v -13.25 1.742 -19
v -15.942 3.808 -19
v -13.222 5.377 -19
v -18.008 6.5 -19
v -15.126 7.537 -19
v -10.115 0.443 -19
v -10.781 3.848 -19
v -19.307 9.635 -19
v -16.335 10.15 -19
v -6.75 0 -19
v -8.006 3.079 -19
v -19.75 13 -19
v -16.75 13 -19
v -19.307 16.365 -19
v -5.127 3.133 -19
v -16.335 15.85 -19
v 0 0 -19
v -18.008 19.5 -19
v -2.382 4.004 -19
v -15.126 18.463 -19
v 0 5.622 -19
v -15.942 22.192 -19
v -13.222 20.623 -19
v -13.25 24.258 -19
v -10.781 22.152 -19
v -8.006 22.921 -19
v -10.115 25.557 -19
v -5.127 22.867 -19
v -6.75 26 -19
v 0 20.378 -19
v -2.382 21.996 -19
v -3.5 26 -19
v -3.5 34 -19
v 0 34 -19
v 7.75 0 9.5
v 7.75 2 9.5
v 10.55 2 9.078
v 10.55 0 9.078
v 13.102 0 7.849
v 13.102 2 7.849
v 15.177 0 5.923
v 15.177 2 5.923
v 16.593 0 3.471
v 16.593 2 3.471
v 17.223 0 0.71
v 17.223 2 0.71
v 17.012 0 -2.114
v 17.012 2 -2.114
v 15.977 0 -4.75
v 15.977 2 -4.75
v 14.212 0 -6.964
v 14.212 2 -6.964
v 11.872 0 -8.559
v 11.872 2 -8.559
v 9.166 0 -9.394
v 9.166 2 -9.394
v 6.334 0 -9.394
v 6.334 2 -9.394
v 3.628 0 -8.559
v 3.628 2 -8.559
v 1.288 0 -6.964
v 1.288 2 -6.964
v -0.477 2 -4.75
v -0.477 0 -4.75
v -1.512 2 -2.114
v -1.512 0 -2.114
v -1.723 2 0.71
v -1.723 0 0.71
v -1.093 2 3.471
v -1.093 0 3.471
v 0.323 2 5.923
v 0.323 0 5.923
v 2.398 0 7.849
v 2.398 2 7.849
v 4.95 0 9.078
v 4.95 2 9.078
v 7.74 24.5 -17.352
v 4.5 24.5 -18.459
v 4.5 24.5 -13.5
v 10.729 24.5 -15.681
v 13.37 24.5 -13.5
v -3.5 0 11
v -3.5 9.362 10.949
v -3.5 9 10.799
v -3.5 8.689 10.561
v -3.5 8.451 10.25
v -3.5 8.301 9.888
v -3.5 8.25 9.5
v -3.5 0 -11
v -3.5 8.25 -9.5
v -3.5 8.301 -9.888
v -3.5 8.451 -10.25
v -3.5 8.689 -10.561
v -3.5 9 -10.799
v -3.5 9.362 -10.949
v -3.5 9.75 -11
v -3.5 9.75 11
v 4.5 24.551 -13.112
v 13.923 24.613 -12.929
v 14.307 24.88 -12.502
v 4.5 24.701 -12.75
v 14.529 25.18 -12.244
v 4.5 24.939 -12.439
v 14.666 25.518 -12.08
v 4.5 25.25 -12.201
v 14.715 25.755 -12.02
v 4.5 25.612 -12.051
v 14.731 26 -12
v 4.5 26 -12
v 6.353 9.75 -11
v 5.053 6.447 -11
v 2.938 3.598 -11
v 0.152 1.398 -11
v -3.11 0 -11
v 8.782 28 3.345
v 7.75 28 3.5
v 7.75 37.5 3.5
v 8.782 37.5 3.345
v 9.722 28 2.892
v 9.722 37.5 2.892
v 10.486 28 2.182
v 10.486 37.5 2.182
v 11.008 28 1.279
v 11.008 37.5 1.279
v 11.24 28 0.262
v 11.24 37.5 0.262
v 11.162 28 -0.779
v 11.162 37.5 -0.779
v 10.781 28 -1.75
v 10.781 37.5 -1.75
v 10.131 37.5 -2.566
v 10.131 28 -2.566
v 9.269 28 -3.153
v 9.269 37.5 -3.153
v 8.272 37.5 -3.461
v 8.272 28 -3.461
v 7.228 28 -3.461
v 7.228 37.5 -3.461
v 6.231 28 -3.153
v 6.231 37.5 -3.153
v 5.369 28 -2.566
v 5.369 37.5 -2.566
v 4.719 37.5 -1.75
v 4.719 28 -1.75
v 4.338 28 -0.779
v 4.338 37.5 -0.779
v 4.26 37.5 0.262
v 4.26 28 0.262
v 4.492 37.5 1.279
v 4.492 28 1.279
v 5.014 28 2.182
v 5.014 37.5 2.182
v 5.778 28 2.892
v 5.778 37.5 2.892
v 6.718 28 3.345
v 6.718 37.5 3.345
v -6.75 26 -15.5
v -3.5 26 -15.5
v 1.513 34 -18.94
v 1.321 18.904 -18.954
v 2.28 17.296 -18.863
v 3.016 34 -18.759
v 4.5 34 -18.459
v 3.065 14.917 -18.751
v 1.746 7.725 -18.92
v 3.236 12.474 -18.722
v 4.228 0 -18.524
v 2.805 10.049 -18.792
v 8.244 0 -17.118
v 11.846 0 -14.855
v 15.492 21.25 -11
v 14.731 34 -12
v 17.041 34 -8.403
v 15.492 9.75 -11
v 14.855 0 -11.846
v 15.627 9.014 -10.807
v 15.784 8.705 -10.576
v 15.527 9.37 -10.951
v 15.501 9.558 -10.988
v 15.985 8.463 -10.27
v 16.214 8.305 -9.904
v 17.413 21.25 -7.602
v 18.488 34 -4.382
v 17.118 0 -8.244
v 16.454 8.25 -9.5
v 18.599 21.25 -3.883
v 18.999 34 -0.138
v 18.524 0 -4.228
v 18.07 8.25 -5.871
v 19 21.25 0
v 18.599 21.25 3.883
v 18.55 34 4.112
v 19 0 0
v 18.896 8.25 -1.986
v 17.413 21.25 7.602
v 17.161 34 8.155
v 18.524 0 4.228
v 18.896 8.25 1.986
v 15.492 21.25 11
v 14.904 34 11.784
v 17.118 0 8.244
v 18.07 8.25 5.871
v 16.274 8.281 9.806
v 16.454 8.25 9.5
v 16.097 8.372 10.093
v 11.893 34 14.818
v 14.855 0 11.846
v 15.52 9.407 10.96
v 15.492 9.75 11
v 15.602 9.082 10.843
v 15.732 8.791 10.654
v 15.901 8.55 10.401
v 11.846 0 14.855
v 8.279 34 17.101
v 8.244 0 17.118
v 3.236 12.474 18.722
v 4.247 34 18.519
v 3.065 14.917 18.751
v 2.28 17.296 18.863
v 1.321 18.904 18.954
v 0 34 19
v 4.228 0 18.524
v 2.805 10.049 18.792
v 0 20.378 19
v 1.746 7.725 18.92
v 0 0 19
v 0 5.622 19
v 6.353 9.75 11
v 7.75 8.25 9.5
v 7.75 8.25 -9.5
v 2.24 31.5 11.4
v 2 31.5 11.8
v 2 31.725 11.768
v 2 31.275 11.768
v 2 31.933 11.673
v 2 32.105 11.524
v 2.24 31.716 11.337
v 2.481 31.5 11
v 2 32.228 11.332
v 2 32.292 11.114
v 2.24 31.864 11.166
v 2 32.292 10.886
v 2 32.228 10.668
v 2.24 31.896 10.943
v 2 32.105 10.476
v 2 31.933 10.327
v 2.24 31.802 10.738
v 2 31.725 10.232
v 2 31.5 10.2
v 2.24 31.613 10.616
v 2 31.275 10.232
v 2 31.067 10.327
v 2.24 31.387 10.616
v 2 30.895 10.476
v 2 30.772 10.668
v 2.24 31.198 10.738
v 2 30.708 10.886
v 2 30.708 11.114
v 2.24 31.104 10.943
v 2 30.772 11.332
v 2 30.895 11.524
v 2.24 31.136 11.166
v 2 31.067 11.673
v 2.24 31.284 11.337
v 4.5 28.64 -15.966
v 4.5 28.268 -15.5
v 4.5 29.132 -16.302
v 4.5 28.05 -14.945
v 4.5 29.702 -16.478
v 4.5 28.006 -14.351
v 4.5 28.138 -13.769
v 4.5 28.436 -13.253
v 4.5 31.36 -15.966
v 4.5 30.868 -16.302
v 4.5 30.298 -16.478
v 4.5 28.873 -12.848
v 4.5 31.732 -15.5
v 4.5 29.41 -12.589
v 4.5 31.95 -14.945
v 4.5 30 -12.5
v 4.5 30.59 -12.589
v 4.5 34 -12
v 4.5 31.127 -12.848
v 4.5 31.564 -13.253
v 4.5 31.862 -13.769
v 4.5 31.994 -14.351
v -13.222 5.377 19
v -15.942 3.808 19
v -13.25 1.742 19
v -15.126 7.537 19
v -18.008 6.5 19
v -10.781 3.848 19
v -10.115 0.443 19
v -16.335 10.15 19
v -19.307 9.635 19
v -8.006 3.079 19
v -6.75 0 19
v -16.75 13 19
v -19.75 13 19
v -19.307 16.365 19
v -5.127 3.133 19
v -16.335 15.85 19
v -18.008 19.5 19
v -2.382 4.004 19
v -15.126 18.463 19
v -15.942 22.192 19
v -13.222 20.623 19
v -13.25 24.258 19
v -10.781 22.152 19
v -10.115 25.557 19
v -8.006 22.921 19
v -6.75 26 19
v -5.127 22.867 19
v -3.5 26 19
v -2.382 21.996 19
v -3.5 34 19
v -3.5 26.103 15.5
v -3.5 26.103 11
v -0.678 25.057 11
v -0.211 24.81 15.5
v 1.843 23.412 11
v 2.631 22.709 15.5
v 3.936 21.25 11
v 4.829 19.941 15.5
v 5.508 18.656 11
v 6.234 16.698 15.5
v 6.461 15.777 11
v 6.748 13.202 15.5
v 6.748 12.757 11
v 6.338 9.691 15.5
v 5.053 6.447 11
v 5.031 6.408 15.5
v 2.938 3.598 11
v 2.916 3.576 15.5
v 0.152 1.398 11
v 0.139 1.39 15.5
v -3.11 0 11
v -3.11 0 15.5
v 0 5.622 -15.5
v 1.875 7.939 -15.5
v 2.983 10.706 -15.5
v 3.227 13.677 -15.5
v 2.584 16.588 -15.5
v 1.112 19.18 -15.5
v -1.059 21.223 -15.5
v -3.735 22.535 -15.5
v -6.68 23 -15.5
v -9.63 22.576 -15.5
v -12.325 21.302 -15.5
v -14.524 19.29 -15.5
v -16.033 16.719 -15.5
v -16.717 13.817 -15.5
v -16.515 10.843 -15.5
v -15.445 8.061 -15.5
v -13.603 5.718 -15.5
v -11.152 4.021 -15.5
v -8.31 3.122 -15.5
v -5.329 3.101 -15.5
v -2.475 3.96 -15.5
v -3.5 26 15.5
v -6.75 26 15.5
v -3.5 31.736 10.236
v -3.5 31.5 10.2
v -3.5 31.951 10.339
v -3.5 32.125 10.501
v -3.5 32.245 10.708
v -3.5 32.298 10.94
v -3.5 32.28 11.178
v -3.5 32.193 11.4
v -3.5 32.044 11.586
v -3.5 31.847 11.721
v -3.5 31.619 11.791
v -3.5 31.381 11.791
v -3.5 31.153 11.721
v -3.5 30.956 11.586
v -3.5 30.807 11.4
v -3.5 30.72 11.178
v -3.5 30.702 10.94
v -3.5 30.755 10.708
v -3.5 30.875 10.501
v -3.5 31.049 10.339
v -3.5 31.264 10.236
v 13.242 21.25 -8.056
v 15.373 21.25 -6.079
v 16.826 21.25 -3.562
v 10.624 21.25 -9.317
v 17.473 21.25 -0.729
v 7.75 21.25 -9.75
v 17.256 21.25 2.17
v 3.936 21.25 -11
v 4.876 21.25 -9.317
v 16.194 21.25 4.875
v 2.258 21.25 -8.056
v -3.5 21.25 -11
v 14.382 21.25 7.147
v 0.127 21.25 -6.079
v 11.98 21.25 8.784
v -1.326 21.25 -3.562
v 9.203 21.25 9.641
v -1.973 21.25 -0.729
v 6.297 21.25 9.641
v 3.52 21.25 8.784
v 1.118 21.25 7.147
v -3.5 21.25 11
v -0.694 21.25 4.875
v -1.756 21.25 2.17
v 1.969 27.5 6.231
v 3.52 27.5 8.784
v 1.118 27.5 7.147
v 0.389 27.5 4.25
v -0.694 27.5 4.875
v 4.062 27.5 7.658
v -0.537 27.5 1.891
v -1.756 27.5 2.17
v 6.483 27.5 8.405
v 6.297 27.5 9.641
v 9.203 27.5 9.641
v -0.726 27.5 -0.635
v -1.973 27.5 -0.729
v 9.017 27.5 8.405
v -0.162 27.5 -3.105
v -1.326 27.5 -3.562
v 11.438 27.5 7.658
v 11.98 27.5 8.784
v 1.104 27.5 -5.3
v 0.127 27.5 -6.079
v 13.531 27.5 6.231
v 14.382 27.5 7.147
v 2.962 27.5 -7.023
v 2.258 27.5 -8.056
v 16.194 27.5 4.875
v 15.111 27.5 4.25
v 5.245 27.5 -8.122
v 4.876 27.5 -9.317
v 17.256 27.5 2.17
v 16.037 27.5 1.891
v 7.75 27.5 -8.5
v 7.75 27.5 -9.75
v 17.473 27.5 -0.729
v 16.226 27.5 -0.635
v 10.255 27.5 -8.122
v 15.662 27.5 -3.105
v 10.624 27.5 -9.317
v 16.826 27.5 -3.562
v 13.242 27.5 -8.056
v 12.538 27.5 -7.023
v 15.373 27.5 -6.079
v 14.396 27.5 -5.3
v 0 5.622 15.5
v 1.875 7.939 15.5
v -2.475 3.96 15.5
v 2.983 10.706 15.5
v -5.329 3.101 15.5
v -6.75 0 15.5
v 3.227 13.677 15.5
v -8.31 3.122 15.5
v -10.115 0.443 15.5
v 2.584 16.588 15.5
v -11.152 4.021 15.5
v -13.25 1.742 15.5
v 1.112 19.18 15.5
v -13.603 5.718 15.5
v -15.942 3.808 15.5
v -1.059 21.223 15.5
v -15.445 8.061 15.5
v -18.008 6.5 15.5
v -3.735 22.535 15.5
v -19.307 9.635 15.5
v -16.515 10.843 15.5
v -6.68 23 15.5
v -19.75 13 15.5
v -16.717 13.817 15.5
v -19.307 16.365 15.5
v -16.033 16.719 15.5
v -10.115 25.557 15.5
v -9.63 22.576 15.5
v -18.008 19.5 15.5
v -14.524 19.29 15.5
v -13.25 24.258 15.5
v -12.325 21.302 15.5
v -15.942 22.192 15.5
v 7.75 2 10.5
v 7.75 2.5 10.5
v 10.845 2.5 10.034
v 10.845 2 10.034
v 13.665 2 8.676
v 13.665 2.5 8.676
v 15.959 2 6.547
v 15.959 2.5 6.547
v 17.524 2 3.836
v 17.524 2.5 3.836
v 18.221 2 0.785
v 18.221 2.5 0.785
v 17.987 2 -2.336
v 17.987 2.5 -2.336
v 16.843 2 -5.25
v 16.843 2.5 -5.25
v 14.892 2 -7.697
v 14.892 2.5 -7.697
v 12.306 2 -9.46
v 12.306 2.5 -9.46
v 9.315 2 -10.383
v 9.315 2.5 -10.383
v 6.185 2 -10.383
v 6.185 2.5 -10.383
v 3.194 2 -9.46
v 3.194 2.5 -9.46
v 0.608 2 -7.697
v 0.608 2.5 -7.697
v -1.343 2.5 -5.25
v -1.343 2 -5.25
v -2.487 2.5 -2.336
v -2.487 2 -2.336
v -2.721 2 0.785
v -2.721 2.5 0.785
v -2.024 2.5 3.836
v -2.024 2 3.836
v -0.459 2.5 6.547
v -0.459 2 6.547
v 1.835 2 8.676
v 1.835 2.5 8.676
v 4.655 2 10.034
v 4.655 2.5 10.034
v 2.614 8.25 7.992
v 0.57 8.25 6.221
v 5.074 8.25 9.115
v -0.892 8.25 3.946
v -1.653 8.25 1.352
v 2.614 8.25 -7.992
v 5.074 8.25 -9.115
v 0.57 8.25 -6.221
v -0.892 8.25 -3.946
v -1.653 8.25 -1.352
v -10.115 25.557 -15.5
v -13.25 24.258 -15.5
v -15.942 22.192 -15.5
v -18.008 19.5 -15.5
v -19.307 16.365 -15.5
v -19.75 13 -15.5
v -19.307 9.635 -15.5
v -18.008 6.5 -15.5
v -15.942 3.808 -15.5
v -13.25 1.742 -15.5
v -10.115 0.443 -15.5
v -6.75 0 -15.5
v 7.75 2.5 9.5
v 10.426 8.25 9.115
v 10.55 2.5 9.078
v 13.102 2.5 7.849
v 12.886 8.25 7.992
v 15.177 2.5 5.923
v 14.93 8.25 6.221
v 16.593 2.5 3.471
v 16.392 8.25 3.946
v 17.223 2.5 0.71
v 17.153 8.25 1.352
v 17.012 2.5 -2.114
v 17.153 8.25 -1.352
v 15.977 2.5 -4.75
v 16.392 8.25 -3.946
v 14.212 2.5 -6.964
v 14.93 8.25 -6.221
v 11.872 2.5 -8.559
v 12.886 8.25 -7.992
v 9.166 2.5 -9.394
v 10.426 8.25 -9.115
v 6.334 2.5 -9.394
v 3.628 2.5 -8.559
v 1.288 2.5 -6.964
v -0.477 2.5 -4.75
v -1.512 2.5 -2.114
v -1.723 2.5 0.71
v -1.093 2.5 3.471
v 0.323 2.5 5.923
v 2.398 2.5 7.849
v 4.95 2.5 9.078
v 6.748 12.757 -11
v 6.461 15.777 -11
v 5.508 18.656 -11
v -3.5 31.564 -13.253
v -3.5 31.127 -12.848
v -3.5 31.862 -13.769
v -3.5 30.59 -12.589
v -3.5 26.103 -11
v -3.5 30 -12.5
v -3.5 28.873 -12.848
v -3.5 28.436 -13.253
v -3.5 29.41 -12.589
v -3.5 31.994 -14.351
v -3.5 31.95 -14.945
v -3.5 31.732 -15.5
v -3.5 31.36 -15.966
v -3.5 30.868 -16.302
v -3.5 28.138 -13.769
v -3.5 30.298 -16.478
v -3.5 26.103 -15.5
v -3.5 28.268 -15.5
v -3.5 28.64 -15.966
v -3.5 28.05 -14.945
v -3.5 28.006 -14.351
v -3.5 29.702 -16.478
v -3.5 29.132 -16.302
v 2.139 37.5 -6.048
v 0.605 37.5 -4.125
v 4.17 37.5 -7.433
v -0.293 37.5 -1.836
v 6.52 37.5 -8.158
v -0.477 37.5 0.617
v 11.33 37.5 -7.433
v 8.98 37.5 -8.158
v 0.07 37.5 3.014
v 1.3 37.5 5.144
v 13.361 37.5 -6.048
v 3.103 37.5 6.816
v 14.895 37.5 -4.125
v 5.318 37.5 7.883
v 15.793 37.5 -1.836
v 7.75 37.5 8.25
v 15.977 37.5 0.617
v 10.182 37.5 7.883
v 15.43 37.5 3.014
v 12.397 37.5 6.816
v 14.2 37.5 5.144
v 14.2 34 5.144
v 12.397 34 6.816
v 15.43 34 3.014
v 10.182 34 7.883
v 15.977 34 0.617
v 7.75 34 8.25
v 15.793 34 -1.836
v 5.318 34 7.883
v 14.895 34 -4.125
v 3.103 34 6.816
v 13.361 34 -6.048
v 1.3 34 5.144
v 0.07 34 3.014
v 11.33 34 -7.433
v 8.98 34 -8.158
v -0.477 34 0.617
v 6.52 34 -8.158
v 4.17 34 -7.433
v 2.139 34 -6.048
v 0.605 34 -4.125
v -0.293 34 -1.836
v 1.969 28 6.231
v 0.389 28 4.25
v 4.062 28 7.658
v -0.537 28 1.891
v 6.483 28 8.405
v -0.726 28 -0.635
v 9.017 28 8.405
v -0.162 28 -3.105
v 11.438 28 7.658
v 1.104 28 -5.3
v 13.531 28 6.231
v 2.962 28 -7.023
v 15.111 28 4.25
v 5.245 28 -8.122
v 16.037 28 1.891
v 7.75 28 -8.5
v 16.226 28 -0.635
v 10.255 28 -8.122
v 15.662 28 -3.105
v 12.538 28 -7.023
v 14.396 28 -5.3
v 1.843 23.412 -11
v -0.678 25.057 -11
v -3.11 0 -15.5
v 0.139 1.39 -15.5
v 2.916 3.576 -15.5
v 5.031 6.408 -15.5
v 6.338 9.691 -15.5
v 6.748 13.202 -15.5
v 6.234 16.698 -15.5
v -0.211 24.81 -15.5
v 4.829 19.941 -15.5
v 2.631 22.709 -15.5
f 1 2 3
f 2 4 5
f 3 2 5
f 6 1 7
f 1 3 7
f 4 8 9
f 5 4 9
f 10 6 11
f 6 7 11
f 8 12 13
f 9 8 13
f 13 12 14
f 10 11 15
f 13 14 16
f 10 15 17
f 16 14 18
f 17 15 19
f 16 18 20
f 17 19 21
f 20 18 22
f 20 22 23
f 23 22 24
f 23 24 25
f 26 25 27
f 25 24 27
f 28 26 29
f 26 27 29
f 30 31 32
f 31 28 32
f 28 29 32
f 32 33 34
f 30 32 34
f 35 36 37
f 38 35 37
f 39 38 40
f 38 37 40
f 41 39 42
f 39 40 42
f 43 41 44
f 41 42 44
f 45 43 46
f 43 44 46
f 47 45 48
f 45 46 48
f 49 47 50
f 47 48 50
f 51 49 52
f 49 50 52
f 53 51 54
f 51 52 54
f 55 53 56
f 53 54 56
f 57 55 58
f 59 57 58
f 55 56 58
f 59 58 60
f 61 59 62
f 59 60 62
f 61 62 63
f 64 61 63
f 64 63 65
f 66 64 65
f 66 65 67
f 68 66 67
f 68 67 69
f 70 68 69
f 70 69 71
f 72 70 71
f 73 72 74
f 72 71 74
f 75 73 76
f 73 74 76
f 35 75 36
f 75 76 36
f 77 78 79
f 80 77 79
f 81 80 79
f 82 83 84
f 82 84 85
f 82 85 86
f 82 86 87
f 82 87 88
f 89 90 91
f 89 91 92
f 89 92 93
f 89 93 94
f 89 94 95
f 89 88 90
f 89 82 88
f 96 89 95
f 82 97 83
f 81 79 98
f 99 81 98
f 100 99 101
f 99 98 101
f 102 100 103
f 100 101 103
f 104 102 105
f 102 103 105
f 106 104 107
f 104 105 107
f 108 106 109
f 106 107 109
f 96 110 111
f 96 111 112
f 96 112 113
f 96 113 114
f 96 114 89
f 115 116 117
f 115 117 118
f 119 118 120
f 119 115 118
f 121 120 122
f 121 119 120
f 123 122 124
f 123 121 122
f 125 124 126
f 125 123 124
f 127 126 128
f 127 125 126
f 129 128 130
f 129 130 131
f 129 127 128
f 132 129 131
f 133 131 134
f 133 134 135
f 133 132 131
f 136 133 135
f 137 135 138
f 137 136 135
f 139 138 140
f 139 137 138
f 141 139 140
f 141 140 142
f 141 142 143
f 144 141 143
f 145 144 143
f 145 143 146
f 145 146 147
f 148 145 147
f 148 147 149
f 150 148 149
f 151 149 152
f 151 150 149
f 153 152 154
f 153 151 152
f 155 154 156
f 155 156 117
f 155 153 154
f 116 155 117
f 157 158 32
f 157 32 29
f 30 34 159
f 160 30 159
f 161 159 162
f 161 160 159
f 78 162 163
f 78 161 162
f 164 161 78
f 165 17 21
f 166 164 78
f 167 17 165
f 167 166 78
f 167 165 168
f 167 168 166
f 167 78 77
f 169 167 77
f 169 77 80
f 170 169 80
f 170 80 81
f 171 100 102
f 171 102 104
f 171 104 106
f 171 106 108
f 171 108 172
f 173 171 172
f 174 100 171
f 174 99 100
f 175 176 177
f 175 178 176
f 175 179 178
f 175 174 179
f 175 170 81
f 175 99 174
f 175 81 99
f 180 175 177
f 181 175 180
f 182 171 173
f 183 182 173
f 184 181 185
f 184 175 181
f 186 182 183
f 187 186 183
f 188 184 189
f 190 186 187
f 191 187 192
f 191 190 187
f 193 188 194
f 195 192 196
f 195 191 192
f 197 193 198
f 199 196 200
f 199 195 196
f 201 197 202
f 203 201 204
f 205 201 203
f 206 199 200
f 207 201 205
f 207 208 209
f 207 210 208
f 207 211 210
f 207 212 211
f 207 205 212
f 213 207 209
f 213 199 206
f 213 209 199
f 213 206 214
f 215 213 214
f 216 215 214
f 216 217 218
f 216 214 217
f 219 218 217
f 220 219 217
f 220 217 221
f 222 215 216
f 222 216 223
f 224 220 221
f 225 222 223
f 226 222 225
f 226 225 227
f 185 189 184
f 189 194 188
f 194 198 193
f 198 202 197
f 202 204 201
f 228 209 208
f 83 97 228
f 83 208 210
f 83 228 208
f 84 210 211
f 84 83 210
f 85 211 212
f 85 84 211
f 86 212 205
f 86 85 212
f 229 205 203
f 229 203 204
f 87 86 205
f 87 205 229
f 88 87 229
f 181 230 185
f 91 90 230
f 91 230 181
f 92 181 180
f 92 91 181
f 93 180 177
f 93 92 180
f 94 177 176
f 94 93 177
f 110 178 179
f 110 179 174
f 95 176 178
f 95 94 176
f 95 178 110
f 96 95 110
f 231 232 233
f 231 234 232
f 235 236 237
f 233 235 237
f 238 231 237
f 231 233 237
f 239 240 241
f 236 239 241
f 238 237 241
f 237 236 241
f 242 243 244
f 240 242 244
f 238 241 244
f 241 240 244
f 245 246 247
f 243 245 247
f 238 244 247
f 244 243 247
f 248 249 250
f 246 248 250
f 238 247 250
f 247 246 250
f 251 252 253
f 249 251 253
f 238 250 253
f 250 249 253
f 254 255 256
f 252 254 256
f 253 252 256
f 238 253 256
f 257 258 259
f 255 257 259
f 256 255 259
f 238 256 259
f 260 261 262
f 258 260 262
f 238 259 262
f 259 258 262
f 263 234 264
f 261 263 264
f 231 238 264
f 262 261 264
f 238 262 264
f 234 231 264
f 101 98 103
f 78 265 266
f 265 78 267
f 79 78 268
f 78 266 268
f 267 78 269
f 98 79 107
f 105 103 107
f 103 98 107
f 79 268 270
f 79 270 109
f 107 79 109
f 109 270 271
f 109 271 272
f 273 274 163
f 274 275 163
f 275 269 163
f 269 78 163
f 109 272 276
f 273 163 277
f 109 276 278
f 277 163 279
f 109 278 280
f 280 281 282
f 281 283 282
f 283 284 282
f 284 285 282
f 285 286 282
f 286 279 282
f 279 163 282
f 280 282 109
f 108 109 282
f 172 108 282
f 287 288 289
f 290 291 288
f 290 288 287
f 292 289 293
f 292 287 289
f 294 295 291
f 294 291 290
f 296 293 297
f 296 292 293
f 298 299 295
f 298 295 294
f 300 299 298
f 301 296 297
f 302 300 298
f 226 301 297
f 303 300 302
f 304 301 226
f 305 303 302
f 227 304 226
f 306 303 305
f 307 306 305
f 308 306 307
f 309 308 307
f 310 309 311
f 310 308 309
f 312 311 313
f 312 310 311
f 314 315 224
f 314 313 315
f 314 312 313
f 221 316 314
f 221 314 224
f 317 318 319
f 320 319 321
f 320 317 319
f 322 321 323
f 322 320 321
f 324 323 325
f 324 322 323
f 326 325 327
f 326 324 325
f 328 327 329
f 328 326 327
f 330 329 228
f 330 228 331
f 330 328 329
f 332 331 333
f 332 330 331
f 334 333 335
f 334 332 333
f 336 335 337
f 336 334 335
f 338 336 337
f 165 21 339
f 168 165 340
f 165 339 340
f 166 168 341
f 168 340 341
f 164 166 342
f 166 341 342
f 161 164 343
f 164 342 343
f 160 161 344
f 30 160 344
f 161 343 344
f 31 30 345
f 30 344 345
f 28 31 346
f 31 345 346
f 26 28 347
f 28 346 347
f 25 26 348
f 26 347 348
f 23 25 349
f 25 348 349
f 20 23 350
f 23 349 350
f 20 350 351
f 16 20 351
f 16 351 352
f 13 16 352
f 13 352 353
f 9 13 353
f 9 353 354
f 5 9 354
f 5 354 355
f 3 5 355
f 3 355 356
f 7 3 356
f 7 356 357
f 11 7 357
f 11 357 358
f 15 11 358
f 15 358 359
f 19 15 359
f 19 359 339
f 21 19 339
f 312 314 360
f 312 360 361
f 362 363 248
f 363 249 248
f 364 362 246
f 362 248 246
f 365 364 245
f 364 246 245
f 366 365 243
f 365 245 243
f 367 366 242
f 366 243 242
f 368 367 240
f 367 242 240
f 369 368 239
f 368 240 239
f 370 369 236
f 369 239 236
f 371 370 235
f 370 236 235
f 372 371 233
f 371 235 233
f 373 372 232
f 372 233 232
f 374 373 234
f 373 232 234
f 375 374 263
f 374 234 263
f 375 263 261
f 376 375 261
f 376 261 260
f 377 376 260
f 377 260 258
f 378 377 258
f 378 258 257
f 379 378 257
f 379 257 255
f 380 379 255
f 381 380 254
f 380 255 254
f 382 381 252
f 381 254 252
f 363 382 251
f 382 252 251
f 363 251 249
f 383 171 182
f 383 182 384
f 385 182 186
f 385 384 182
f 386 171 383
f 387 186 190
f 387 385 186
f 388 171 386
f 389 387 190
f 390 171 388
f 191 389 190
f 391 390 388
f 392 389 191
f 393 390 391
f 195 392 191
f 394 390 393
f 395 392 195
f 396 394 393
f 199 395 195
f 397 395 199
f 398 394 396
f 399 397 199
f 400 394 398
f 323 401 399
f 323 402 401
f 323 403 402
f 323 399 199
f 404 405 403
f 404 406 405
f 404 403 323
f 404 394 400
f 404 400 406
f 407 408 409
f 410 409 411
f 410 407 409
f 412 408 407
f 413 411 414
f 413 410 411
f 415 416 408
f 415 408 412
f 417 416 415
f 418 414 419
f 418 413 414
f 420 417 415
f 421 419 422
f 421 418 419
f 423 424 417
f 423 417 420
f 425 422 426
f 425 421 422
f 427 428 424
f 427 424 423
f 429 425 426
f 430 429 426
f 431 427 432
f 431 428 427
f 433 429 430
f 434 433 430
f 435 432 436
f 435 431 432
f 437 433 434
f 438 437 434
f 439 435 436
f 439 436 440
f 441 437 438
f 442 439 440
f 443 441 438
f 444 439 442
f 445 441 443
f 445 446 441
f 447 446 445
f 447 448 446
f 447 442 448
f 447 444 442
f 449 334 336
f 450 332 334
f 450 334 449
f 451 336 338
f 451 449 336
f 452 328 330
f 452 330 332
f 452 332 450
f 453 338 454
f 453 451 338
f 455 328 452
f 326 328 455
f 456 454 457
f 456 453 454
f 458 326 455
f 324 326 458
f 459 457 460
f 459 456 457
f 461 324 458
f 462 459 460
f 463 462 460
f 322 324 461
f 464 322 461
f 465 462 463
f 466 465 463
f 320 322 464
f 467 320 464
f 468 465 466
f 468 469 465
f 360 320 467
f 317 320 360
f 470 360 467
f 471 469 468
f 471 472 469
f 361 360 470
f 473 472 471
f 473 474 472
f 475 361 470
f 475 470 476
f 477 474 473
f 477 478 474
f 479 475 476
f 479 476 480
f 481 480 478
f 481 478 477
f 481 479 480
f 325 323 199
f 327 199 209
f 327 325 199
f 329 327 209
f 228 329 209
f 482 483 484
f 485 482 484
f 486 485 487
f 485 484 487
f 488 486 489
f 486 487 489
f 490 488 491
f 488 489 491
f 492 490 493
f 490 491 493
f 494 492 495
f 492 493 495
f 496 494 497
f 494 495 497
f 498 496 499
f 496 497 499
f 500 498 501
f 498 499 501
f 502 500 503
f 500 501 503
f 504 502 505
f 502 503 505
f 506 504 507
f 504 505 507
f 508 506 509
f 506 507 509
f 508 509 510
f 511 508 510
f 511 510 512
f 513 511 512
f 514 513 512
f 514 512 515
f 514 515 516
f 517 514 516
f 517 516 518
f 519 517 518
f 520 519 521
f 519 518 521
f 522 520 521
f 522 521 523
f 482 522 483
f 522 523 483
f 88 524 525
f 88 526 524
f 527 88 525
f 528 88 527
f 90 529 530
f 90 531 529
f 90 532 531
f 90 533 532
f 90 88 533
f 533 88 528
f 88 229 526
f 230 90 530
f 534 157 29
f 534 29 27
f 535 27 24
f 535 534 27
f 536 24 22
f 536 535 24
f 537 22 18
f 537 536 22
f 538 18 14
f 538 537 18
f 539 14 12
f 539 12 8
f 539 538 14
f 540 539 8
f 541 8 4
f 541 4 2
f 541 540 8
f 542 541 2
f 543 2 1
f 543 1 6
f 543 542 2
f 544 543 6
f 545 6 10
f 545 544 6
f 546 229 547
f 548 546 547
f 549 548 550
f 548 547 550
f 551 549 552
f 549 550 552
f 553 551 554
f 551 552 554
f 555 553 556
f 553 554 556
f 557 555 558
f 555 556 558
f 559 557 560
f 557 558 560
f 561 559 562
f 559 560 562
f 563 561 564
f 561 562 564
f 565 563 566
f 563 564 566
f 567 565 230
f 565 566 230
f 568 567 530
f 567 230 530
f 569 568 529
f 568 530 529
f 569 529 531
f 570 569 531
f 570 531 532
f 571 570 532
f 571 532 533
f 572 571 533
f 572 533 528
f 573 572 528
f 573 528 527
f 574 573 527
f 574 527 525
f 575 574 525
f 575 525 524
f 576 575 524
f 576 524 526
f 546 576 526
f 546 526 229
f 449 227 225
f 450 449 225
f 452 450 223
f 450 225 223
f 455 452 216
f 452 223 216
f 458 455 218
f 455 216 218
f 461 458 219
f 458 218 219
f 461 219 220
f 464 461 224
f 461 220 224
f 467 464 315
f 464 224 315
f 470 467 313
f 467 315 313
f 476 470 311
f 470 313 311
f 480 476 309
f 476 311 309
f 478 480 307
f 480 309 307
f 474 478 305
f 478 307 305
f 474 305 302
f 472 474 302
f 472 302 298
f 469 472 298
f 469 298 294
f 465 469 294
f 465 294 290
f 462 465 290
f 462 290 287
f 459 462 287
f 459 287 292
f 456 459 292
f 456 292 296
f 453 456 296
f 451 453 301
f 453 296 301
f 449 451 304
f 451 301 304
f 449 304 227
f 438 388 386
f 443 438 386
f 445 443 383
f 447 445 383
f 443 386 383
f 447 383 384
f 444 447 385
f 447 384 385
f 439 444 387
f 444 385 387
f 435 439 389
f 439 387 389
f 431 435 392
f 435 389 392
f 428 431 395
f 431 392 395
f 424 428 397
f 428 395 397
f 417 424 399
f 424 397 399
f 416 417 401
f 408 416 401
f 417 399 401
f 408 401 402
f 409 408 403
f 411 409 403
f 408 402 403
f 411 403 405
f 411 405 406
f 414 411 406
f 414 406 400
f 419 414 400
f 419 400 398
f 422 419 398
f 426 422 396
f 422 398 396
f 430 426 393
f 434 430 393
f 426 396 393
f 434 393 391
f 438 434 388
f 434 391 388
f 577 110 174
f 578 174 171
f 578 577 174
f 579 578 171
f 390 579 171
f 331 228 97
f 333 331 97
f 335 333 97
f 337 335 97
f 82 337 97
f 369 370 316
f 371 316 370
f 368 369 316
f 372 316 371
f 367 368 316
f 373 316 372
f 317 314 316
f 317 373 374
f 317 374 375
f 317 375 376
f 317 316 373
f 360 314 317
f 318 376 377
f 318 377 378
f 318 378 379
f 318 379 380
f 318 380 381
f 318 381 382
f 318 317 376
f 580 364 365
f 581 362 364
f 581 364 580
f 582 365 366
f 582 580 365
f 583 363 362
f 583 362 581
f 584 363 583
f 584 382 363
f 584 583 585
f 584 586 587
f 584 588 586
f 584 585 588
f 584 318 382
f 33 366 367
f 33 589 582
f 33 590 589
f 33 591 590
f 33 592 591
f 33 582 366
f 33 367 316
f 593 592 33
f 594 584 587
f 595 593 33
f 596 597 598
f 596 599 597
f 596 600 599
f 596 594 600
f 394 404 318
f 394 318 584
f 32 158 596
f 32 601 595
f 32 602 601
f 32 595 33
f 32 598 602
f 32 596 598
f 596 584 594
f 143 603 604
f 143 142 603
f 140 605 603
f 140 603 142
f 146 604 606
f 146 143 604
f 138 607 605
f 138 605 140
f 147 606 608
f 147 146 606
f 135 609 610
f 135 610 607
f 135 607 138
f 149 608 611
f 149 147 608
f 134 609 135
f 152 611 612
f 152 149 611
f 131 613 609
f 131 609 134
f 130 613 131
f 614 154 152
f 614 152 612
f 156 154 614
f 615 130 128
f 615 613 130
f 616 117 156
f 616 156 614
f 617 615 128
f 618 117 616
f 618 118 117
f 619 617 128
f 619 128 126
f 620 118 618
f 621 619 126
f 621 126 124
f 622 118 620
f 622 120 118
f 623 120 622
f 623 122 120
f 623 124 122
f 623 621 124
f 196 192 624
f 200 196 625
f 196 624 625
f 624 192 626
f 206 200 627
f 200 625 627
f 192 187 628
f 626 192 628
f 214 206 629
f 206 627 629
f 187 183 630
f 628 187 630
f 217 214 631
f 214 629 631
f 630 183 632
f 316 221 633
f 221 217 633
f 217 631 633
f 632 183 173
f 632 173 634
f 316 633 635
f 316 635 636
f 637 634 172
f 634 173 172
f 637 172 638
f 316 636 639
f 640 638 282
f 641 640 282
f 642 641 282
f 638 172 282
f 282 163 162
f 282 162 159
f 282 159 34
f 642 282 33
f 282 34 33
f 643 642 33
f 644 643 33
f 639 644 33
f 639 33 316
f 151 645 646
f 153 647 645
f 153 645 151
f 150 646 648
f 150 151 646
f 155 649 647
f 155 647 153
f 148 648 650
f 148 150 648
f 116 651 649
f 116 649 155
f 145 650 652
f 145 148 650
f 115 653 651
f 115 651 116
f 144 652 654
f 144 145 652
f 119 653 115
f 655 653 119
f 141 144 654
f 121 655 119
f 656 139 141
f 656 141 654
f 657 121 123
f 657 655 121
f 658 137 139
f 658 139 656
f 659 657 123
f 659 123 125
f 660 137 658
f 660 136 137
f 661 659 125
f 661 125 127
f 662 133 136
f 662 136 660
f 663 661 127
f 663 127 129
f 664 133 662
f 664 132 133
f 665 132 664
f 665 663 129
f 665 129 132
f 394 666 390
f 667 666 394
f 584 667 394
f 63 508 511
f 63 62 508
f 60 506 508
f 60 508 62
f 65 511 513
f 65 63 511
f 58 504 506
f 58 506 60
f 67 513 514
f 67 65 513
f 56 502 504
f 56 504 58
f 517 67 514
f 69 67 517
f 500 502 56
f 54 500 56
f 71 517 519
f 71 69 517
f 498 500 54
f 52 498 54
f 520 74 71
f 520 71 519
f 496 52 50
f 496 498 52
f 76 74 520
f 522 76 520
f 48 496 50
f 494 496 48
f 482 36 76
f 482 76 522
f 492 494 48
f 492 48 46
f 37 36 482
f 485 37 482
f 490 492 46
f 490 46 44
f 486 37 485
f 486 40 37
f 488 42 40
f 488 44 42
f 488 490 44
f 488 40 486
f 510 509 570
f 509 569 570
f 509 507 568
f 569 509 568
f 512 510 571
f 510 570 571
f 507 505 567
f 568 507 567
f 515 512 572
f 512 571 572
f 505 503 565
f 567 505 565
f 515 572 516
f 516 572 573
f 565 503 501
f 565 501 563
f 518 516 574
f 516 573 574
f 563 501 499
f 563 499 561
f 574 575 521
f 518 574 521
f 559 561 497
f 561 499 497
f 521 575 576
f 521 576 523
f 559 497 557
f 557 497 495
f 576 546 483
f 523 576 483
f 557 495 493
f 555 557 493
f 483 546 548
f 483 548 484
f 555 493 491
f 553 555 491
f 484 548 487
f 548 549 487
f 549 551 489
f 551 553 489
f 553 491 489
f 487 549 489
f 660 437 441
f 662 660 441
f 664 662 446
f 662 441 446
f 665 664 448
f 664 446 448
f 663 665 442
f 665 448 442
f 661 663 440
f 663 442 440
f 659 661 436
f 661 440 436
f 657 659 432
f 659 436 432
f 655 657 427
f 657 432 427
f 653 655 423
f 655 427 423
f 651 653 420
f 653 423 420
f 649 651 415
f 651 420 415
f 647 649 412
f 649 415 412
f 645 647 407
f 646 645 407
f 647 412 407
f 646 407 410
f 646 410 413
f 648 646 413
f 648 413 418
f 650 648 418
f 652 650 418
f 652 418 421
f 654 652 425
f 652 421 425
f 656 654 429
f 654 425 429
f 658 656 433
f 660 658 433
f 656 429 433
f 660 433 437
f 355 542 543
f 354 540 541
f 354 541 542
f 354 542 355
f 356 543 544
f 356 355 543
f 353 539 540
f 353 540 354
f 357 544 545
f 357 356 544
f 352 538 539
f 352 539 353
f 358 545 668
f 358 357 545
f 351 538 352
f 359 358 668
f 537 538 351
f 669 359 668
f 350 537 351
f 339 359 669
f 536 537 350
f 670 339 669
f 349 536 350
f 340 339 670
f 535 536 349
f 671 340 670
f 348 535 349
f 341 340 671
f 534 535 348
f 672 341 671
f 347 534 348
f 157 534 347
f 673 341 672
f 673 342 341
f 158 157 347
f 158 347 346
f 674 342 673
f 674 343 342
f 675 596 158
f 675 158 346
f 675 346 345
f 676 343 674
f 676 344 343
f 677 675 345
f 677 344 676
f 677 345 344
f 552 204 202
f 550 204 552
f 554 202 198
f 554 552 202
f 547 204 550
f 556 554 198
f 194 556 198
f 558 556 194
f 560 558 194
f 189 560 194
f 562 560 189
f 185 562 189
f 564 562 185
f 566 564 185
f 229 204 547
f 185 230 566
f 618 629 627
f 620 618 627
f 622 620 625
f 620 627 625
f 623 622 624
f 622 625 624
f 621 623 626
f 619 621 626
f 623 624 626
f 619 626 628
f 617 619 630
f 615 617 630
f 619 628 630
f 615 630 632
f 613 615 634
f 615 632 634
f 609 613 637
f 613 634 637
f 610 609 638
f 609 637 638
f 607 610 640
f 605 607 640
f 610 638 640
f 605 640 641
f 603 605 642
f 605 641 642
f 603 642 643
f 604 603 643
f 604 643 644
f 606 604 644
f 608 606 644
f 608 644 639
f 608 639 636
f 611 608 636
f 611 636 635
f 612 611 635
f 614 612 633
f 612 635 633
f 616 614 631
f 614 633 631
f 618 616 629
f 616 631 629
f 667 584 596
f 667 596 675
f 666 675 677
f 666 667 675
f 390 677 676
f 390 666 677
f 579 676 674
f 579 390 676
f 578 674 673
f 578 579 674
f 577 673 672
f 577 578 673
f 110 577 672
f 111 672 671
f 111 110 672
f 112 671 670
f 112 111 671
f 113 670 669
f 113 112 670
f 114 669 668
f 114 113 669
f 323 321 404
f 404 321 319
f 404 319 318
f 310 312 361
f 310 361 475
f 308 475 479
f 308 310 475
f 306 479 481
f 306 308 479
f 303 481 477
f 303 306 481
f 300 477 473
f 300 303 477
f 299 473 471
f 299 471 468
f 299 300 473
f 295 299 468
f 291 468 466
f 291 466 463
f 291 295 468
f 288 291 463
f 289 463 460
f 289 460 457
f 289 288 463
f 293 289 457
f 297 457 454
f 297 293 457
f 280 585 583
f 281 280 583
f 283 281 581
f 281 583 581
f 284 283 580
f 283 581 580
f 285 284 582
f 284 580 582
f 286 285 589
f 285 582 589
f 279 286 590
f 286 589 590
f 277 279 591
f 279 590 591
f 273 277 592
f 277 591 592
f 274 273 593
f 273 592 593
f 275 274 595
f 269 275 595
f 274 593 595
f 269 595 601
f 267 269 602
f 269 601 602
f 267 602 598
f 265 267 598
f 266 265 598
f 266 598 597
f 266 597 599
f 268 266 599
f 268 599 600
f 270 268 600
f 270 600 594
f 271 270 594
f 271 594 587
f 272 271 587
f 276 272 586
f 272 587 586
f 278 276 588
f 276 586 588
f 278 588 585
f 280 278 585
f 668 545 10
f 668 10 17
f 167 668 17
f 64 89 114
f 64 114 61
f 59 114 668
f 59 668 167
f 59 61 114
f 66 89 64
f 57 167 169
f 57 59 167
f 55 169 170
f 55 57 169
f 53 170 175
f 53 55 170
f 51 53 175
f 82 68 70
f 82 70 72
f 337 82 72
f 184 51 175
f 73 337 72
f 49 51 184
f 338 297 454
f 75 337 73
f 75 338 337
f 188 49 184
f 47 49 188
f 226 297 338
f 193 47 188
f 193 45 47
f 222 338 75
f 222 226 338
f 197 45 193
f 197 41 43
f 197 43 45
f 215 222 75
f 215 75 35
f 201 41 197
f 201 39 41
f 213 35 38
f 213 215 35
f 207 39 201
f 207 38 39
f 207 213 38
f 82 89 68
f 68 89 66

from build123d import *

# Parameters (mm, degrees)
SKETCH2_R               = 3.5
BOSS_EXTRUDE1_DEPTH     = 34
SKETCH19_R              = 8.25
SKETCH19_R_2            = 3.5
BOSS_EXTRUDE3_DEPTH     = 3.5
BOSS_EXTRUDE2_DEPTH     = 3.5
SKETCH4_R               = 10
CUT_EXTRUDE1_DEPTH      = 3.5
LPATTERN4_COUNT         = 2
LPATTERN4_PITCH         = 34.5
CUT_EXTRUDE3_DEPTH      = 48.681233293
SKETCH7_R               = 13.5
CUT_EXTRUDE4_DEPTH      = 4.5
LPATTERN3_COUNT         = 2
LPATTERN3_PITCH         = 26.5
M2_TAPPED_HOLE1_D       = 1.6
M2_TAPPED_HOLE1_DEPTH   = 5.5
M2_TAPPED_HOLE1_TIP     = 0.480688495
SKETCH17_R              = 2
CUT_EXTRUDE5_DEPTH      = 8
CUT_EXTRUDE6_REACH      = 50.532
CUT_EXTRUDE6_END_RADIUS = 19
SKETCH20_R              = 9.75
CUT_EXTRUDE7_DEPTH      = 6.25
SKETCH21_R              = 8.5
CUT_EXTRUDE8_DEPTH      = 0.5
SKETCH22_R              = 9.5
CUT_EXTRUDE9_DEPTH      = 5.75
SKETCH23_R              = 10.5
CUT_EXTRUDE10_DEPTH     = 0.5
SKETCH24_R              = 9.5
CUT_EXTRUDE11_DEPTH     = 2


with BuildPart() as part:
    # Sketch2 → Boss-Extrude1 (new body)
    with BuildSketch(Plane(origin=(0, 0, 0), x_dir=(1, 0, 0), z_dir=(0, 1, 0))):
        with BuildLine():
            Line((-3.5, -19), (-3.5, 19))
            Line((-3.5, 19), (0, 19))
            ThreePointArc((0, 19), (19, 0), (0, -19))
            Line((0, -19), (-3.5, -19))
        make_face()
        with Locations(Location((7.75, 0, 0), (0, 0, 270))):
            Circle(SKETCH2_R, mode=Mode.SUBTRACT)
    extrude(amount=BOSS_EXTRUDE1_DEPTH)

    # Sketch19 → Boss-Extrude3 (add)
    with BuildSketch(Plane(origin=(0, 34, 0), x_dir=(1, 0, 0), z_dir=(0, 1, 0))):
        with Locations(Location((7.75, 0, 0), (0, 0, 270))):
            Circle(SKETCH19_R)
        with Locations(Location((7.75, 0, 0), (0, 0, 270))):
            Circle(SKETCH19_R_2, mode=Mode.SUBTRACT)
    extrude(amount=BOSS_EXTRUDE3_DEPTH)

    # Sketch3 → Boss-Extrude2 (add)
    with BuildSketch(Plane.XY.offset(19)):
        with BuildLine():
            Line((-6.75, 0), (-3.5, 0))
            Line((-3.5, 0), (-3.5, 26))
            Line((-3.5, 26), (-6.75, 26))
            ThreePointArc((-6.75, 26), (-19.75, 13), (-6.75, 0))
        make_face()
    boss_extrude2 = extrude(amount=-BOSS_EXTRUDE2_DEPTH)

    # Sketch4 → Cut-Extrude1 (cut)
    with BuildSketch(Plane.XY.offset(19)):
        with Locations(Location((-6.75, 13, 0), (0, 0, 312.454150204))):
            Circle(SKETCH4_R)
    cut_extrude1 = extrude(amount=-CUT_EXTRUDE1_DEPTH, mode=Mode.SUBTRACT)

    # LPattern4: Boss-Extrude2, Cut-Extrude1 ×2
    with Locations(*[(0, 0, -i * LPATTERN4_PITCH) for i in range(1, LPATTERN4_COUNT)]):
        add(boss_extrude2)
        add(cut_extrude1, mode=Mode.SUBTRACT)

    # Sketch6 → Cut-Extrude3 (cut, through all)
    with BuildSketch(Plane(origin=(-3.5, 0, 0), x_dir=(0, 0, -1), z_dir=(1, 0, 0))):
        with BuildLine():
            Line((11, 21.25), (-11, 21.25))
            Line((-11, 21.25), (-11, 9.75))
            ThreePointArc((-11, 9.75), (-10.560660172, 8.689339828), (-9.5, 8.25))
            Line((-9.5, 8.25), (9.5, 8.25))
            ThreePointArc((9.5, 8.25), (10.560660172, 8.689339828), (11, 9.75))
            Line((11, 9.75), (11, 21.25))
        make_face()
    extrude(amount=CUT_EXTRUDE3_DEPTH, mode=Mode.SUBTRACT)

    # Sketch7 → Cut-Extrude4 (cut)
    with BuildSketch(Plane(origin=(0, 0, 15.5), x_dir=(-1, 0, 0), z_dir=(0, 0, -1))):
        with Locations((6.75, 13)):
            Circle(SKETCH7_R)
    cut_extrude4 = extrude(amount=CUT_EXTRUDE4_DEPTH, mode=Mode.SUBTRACT)

    # LPattern3: Cut-Extrude4 ×2
    with Locations(*[(0, 0, -i * LPATTERN3_PITCH) for i in range(1, LPATTERN3_COUNT)]):
        add(cut_extrude4, mode=Mode.SUBTRACT)

    # M2 Tapped Hole1
    with Locations(Plane.ZY.offset(3.5)):
        with Locations((11, 31.5)):
            Hole(M2_TAPPED_HOLE1_D / 2, depth=M2_TAPPED_HOLE1_DEPTH)
            with Locations((0, 0, -(M2_TAPPED_HOLE1_DEPTH + M2_TAPPED_HOLE1_TIP / 2))):  # 118° drill point
                Cone(0, M2_TAPPED_HOLE1_D / 2, M2_TAPPED_HOLE1_TIP, mode=Mode.SUBTRACT)

    # Sketch17 → Cut-Extrude5 (cut)
    with BuildSketch(Plane.ZY.offset(3.5)):
        with Locations((-14.5, 30)):
            Circle(SKETCH17_R)
    extrude(amount=-CUT_EXTRUDE5_DEPTH, mode=Mode.SUBTRACT)

    # Cut-Extrude6: up to this cylinder (the profile starts inside it)
    cut_extrude6_end = Plane(origin=(0, 29.282291, 0), z_dir=(0, -1, 0)) * Cylinder(CUT_EXTRUDE6_END_RADIUS, 140.064, mode=Mode.PRIVATE)
    # Sketch18 → Cut-Extrude6 (cut, up to the surface)
    with BuildSketch(Plane.ZY.offset(-4.5), mode=Mode.PRIVATE) as cut_extrude6_sk1:
        with BuildLine():
            Line((-19, 24.5), (-13.5, 24.5))
            ThreePointArc((-13.5, 24.5), (-12.439339828, 24.939339828), (-12, 26))
            Line((-12, 26), (-12, 34))
            Line((-12, 34), (-19, 34))
            Line((-19, 34), (-19, 24.5))
        make_face()
    cut_extrude6_tool1 = extrude(cut_extrude6_sk1.sketch, amount=-CUT_EXTRUDE6_REACH, mode=Mode.PRIVATE) & cut_extrude6_end
    add(cut_extrude6_tool1.solids().sort_by_distance((4.5, 29.282291, -15.523149))[0], mode=Mode.SUBTRACT)

    # Sketch20 → Cut-Extrude7 (cut)
    with BuildSketch(Plane.XZ.offset(-21.25)):
        with Locations(Location((7.75, 0, 0), (0, 0, 270))):
            Circle(SKETCH20_R)
    extrude(amount=-CUT_EXTRUDE7_DEPTH, mode=Mode.SUBTRACT)

    # Sketch21 → Cut-Extrude8 (cut)
    with BuildSketch(Plane.XZ.offset(-27.5)):
        with Locations(Location((7.75, 0, 0), (0, 0, 270))):
            Circle(SKETCH21_R)
    extrude(amount=-CUT_EXTRUDE8_DEPTH, mode=Mode.SUBTRACT)

    # Sketch22 → Cut-Extrude9 (cut)
    with BuildSketch(Plane(origin=(0, 8.25, 0), x_dir=(1, 0, 0), z_dir=(0, 1, 0))):
        with Locations(Location((7.75, 0, 0), (0, 0, 270))):
            Circle(SKETCH22_R)
    extrude(amount=-CUT_EXTRUDE9_DEPTH, mode=Mode.SUBTRACT)

    # Sketch23 → Cut-Extrude10 (cut)
    with BuildSketch(Plane(origin=(0, 2.5, 0), x_dir=(1, 0, 0), z_dir=(0, 1, 0))):
        with Locations(Location((7.75, 0, 0), (0, 0, 270))):
            Circle(SKETCH23_R)
    extrude(amount=-CUT_EXTRUDE10_DEPTH, mode=Mode.SUBTRACT)

    # Sketch24 → Cut-Extrude11 (cut)
    with BuildSketch(Plane(origin=(0, 2, 0), x_dir=(1, 0, 0), z_dir=(0, 1, 0))):
        with Locations(Location((7.75, 0, 0), (0, 0, 270))):
            Circle(SKETCH24_R)
    extrude(amount=-CUT_EXTRUDE11_DEPTH, mode=Mode.SUBTRACT)


solid = part.part
